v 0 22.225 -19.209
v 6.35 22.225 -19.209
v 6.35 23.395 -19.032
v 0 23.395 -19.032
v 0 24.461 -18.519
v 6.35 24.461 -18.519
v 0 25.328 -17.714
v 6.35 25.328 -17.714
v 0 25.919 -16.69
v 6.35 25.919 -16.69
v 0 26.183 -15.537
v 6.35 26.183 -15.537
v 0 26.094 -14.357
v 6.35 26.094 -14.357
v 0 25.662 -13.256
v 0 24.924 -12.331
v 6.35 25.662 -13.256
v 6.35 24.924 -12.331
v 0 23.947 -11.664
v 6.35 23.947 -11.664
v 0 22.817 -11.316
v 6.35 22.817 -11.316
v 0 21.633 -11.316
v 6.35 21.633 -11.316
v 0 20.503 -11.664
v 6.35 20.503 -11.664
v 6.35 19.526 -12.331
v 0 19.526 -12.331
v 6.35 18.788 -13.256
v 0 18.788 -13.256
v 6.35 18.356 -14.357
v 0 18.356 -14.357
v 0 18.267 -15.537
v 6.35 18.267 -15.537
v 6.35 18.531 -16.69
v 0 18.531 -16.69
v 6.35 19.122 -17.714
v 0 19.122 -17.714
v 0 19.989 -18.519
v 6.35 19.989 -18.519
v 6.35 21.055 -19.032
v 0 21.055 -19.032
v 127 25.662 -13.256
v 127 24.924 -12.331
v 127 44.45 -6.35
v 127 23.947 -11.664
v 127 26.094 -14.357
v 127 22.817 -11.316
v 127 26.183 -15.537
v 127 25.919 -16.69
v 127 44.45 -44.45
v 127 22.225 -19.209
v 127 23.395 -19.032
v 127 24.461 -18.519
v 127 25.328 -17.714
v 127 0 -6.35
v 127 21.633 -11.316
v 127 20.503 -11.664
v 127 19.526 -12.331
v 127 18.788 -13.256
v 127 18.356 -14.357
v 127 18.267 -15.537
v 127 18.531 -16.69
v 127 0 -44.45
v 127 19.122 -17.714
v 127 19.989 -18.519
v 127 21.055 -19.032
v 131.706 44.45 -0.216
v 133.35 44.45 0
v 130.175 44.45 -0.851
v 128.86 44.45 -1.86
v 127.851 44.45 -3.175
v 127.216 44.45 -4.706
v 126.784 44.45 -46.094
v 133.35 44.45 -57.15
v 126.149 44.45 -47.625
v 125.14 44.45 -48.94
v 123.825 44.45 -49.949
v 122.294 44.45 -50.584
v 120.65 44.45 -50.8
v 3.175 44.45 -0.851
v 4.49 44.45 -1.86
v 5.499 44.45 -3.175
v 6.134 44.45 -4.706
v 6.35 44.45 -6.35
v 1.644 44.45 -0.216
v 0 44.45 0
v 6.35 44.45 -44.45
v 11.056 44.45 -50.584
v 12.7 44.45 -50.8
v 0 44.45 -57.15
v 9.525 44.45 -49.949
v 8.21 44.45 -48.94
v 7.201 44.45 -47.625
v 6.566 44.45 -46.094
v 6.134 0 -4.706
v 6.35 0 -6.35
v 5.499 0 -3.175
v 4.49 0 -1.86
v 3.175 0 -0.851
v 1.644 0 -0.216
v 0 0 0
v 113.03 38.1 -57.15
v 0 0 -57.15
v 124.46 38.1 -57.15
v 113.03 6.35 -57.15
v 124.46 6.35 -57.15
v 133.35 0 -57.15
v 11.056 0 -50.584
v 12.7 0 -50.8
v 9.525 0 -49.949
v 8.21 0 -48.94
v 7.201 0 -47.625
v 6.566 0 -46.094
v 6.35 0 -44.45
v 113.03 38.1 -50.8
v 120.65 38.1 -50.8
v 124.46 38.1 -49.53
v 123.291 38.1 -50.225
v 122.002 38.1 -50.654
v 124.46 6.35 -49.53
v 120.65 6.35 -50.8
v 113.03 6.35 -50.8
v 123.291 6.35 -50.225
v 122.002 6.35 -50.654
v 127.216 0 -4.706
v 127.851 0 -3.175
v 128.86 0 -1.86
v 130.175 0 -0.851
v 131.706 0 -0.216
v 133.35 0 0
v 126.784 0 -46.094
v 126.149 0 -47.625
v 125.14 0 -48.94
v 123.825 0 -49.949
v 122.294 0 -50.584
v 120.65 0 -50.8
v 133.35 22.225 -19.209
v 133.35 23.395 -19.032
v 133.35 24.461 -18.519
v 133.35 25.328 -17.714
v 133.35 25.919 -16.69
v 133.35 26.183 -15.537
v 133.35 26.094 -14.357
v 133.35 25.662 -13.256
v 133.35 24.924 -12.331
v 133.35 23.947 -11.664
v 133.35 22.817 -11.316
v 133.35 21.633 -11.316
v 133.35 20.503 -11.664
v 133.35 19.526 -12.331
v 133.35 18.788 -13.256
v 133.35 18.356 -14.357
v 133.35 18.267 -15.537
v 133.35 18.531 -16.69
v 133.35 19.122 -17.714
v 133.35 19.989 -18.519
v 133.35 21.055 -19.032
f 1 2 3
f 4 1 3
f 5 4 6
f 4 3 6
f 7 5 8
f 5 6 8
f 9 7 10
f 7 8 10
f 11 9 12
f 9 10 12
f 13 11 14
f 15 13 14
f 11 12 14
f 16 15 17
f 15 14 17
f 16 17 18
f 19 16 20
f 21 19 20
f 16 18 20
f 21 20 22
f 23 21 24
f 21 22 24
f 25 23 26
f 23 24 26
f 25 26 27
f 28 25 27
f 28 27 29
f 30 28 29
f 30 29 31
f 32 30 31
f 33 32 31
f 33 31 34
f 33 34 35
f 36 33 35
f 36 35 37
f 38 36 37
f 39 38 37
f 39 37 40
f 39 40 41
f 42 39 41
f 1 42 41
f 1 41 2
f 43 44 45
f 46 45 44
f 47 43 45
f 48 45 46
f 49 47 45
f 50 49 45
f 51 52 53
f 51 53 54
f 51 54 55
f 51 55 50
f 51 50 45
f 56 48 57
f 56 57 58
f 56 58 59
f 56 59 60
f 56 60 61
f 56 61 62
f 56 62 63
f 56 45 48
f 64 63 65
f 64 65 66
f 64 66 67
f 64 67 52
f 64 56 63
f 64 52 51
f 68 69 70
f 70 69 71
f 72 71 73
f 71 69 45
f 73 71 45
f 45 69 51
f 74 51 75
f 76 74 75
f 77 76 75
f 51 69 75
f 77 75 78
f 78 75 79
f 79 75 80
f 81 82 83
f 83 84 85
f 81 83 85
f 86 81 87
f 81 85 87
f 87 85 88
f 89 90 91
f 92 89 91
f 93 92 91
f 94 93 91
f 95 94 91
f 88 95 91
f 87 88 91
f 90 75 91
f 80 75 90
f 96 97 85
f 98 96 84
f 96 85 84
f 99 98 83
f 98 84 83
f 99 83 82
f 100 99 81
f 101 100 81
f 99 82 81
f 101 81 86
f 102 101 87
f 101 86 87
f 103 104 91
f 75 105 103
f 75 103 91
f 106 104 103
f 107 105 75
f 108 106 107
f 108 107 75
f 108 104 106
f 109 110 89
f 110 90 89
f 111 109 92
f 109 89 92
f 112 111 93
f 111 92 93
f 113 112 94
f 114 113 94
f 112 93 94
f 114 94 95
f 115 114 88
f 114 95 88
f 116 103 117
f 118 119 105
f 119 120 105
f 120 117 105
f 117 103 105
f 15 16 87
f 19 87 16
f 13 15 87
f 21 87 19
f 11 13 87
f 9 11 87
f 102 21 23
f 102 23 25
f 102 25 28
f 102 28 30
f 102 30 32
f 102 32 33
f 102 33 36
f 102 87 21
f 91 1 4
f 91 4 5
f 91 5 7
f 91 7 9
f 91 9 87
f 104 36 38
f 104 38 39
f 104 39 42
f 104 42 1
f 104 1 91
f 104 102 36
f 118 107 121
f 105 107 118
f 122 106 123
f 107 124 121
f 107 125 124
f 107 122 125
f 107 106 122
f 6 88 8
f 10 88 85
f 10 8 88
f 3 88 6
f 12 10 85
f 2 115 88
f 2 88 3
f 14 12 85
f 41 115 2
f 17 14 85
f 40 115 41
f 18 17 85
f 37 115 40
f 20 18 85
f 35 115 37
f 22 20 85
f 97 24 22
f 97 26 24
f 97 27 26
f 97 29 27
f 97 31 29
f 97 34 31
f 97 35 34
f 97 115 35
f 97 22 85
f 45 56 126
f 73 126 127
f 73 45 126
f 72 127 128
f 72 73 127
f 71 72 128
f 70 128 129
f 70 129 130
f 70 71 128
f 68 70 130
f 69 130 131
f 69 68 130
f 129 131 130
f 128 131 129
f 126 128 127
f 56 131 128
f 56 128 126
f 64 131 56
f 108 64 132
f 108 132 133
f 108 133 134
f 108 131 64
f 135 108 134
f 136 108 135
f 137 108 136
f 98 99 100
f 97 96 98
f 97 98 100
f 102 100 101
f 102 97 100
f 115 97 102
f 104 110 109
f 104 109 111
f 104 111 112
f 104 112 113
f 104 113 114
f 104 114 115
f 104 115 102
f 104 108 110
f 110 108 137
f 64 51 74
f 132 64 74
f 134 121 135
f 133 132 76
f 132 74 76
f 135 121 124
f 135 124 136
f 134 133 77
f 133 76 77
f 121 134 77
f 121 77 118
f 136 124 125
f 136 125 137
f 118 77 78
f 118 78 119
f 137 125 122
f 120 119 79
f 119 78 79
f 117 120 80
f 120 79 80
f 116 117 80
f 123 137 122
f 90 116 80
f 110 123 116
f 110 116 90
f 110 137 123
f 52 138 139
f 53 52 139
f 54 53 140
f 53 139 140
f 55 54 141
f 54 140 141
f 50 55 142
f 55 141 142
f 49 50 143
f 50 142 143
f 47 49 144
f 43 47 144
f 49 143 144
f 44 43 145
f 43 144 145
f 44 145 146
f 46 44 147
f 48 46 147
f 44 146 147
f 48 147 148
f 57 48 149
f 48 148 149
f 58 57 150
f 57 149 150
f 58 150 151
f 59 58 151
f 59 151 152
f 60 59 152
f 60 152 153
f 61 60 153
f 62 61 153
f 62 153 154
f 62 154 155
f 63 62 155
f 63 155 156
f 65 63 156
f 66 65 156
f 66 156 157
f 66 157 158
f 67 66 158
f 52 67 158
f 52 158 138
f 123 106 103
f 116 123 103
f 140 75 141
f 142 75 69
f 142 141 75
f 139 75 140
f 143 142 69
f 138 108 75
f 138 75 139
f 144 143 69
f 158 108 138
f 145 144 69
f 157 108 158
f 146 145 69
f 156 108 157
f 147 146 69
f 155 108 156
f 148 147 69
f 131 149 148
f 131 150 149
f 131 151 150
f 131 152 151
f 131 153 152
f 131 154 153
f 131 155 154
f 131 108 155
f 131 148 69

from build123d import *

# Parameters (mm, degrees)
BOSS_EXTRUDE1_DEPTH     = 44.45
FILLET1_R               = 6.35
FILLET2_R               = 6.35
SKETCH4_R               = 3.96875
CUT_EXTRUDE2_DEPTH      = 254
CUT_EXTRUDE4_DEPTH      = 150.461249158
CUT_EXTRUDE4_DEPTH_BACK = 150.461249158
SKETCH5_W               = 11.43
SKETCH5_H               = 31.75


with BuildPart() as part:
    # Sketch1 → Boss-Extrude1 (new body)
    with BuildSketch(Plane(origin=(0, 0, 0), x_dir=(1, 0, 0), z_dir=(0, 1, 0))):
        Polygon((0, 0), (0, 57.15), (133.35, 57.15), (133.35, 0), (127, 0), (127, 50.8), (6.35, 50.8), (6.35, 0), align=None)
    extrude(amount=BOSS_EXTRUDE1_DEPTH)

    # Fillet1
    fillet1_edges = [part.edges().sort_by_distance(p)[0] for p in [
        (6.35, 22.225, -50.8),
        (127, 22.225, -50.8),
    ]]
    fillet(fillet1_edges, radius=FILLET1_R)

    # Fillet2
    fillet2_edges = [part.edges().sort_by_distance(p)[0] for p in [
        (127, 22.225, 0),
        (6.35, 22.225, 0),
    ]]
    fillet(fillet2_edges, radius=FILLET2_R - 0.0001)  # a hair under: the kernel refuses the full size

    # Sketch4 → Cut-Extrude2 (cut)
    with BuildSketch(Plane(origin=(139.7, 1.415162488, -69.948790088), x_dir=(0, 0, -1), z_dir=(1, 0, 0))):
        with Locations((-54.708790088, 20.809837512)):
            Circle(SKETCH4_R)
    extrude(amount=-CUT_EXTRUDE2_DEPTH, mode=Mode.SUBTRACT)

    # Sketch5 → Cut-Extrude4 (cut, two sides: drawn at the far end of the back side and taken through both)
    with BuildSketch(Plane.XY.offset(-50.8).offset(-CUT_EXTRUDE4_DEPTH_BACK)):
        with Locations((118.745, 22.225)):
            Rectangle(SKETCH5_W, SKETCH5_H)
    extrude(amount=CUT_EXTRUDE4_DEPTH + CUT_EXTRUDE4_DEPTH_BACK, mode=Mode.SUBTRACT)


solid = part.part
